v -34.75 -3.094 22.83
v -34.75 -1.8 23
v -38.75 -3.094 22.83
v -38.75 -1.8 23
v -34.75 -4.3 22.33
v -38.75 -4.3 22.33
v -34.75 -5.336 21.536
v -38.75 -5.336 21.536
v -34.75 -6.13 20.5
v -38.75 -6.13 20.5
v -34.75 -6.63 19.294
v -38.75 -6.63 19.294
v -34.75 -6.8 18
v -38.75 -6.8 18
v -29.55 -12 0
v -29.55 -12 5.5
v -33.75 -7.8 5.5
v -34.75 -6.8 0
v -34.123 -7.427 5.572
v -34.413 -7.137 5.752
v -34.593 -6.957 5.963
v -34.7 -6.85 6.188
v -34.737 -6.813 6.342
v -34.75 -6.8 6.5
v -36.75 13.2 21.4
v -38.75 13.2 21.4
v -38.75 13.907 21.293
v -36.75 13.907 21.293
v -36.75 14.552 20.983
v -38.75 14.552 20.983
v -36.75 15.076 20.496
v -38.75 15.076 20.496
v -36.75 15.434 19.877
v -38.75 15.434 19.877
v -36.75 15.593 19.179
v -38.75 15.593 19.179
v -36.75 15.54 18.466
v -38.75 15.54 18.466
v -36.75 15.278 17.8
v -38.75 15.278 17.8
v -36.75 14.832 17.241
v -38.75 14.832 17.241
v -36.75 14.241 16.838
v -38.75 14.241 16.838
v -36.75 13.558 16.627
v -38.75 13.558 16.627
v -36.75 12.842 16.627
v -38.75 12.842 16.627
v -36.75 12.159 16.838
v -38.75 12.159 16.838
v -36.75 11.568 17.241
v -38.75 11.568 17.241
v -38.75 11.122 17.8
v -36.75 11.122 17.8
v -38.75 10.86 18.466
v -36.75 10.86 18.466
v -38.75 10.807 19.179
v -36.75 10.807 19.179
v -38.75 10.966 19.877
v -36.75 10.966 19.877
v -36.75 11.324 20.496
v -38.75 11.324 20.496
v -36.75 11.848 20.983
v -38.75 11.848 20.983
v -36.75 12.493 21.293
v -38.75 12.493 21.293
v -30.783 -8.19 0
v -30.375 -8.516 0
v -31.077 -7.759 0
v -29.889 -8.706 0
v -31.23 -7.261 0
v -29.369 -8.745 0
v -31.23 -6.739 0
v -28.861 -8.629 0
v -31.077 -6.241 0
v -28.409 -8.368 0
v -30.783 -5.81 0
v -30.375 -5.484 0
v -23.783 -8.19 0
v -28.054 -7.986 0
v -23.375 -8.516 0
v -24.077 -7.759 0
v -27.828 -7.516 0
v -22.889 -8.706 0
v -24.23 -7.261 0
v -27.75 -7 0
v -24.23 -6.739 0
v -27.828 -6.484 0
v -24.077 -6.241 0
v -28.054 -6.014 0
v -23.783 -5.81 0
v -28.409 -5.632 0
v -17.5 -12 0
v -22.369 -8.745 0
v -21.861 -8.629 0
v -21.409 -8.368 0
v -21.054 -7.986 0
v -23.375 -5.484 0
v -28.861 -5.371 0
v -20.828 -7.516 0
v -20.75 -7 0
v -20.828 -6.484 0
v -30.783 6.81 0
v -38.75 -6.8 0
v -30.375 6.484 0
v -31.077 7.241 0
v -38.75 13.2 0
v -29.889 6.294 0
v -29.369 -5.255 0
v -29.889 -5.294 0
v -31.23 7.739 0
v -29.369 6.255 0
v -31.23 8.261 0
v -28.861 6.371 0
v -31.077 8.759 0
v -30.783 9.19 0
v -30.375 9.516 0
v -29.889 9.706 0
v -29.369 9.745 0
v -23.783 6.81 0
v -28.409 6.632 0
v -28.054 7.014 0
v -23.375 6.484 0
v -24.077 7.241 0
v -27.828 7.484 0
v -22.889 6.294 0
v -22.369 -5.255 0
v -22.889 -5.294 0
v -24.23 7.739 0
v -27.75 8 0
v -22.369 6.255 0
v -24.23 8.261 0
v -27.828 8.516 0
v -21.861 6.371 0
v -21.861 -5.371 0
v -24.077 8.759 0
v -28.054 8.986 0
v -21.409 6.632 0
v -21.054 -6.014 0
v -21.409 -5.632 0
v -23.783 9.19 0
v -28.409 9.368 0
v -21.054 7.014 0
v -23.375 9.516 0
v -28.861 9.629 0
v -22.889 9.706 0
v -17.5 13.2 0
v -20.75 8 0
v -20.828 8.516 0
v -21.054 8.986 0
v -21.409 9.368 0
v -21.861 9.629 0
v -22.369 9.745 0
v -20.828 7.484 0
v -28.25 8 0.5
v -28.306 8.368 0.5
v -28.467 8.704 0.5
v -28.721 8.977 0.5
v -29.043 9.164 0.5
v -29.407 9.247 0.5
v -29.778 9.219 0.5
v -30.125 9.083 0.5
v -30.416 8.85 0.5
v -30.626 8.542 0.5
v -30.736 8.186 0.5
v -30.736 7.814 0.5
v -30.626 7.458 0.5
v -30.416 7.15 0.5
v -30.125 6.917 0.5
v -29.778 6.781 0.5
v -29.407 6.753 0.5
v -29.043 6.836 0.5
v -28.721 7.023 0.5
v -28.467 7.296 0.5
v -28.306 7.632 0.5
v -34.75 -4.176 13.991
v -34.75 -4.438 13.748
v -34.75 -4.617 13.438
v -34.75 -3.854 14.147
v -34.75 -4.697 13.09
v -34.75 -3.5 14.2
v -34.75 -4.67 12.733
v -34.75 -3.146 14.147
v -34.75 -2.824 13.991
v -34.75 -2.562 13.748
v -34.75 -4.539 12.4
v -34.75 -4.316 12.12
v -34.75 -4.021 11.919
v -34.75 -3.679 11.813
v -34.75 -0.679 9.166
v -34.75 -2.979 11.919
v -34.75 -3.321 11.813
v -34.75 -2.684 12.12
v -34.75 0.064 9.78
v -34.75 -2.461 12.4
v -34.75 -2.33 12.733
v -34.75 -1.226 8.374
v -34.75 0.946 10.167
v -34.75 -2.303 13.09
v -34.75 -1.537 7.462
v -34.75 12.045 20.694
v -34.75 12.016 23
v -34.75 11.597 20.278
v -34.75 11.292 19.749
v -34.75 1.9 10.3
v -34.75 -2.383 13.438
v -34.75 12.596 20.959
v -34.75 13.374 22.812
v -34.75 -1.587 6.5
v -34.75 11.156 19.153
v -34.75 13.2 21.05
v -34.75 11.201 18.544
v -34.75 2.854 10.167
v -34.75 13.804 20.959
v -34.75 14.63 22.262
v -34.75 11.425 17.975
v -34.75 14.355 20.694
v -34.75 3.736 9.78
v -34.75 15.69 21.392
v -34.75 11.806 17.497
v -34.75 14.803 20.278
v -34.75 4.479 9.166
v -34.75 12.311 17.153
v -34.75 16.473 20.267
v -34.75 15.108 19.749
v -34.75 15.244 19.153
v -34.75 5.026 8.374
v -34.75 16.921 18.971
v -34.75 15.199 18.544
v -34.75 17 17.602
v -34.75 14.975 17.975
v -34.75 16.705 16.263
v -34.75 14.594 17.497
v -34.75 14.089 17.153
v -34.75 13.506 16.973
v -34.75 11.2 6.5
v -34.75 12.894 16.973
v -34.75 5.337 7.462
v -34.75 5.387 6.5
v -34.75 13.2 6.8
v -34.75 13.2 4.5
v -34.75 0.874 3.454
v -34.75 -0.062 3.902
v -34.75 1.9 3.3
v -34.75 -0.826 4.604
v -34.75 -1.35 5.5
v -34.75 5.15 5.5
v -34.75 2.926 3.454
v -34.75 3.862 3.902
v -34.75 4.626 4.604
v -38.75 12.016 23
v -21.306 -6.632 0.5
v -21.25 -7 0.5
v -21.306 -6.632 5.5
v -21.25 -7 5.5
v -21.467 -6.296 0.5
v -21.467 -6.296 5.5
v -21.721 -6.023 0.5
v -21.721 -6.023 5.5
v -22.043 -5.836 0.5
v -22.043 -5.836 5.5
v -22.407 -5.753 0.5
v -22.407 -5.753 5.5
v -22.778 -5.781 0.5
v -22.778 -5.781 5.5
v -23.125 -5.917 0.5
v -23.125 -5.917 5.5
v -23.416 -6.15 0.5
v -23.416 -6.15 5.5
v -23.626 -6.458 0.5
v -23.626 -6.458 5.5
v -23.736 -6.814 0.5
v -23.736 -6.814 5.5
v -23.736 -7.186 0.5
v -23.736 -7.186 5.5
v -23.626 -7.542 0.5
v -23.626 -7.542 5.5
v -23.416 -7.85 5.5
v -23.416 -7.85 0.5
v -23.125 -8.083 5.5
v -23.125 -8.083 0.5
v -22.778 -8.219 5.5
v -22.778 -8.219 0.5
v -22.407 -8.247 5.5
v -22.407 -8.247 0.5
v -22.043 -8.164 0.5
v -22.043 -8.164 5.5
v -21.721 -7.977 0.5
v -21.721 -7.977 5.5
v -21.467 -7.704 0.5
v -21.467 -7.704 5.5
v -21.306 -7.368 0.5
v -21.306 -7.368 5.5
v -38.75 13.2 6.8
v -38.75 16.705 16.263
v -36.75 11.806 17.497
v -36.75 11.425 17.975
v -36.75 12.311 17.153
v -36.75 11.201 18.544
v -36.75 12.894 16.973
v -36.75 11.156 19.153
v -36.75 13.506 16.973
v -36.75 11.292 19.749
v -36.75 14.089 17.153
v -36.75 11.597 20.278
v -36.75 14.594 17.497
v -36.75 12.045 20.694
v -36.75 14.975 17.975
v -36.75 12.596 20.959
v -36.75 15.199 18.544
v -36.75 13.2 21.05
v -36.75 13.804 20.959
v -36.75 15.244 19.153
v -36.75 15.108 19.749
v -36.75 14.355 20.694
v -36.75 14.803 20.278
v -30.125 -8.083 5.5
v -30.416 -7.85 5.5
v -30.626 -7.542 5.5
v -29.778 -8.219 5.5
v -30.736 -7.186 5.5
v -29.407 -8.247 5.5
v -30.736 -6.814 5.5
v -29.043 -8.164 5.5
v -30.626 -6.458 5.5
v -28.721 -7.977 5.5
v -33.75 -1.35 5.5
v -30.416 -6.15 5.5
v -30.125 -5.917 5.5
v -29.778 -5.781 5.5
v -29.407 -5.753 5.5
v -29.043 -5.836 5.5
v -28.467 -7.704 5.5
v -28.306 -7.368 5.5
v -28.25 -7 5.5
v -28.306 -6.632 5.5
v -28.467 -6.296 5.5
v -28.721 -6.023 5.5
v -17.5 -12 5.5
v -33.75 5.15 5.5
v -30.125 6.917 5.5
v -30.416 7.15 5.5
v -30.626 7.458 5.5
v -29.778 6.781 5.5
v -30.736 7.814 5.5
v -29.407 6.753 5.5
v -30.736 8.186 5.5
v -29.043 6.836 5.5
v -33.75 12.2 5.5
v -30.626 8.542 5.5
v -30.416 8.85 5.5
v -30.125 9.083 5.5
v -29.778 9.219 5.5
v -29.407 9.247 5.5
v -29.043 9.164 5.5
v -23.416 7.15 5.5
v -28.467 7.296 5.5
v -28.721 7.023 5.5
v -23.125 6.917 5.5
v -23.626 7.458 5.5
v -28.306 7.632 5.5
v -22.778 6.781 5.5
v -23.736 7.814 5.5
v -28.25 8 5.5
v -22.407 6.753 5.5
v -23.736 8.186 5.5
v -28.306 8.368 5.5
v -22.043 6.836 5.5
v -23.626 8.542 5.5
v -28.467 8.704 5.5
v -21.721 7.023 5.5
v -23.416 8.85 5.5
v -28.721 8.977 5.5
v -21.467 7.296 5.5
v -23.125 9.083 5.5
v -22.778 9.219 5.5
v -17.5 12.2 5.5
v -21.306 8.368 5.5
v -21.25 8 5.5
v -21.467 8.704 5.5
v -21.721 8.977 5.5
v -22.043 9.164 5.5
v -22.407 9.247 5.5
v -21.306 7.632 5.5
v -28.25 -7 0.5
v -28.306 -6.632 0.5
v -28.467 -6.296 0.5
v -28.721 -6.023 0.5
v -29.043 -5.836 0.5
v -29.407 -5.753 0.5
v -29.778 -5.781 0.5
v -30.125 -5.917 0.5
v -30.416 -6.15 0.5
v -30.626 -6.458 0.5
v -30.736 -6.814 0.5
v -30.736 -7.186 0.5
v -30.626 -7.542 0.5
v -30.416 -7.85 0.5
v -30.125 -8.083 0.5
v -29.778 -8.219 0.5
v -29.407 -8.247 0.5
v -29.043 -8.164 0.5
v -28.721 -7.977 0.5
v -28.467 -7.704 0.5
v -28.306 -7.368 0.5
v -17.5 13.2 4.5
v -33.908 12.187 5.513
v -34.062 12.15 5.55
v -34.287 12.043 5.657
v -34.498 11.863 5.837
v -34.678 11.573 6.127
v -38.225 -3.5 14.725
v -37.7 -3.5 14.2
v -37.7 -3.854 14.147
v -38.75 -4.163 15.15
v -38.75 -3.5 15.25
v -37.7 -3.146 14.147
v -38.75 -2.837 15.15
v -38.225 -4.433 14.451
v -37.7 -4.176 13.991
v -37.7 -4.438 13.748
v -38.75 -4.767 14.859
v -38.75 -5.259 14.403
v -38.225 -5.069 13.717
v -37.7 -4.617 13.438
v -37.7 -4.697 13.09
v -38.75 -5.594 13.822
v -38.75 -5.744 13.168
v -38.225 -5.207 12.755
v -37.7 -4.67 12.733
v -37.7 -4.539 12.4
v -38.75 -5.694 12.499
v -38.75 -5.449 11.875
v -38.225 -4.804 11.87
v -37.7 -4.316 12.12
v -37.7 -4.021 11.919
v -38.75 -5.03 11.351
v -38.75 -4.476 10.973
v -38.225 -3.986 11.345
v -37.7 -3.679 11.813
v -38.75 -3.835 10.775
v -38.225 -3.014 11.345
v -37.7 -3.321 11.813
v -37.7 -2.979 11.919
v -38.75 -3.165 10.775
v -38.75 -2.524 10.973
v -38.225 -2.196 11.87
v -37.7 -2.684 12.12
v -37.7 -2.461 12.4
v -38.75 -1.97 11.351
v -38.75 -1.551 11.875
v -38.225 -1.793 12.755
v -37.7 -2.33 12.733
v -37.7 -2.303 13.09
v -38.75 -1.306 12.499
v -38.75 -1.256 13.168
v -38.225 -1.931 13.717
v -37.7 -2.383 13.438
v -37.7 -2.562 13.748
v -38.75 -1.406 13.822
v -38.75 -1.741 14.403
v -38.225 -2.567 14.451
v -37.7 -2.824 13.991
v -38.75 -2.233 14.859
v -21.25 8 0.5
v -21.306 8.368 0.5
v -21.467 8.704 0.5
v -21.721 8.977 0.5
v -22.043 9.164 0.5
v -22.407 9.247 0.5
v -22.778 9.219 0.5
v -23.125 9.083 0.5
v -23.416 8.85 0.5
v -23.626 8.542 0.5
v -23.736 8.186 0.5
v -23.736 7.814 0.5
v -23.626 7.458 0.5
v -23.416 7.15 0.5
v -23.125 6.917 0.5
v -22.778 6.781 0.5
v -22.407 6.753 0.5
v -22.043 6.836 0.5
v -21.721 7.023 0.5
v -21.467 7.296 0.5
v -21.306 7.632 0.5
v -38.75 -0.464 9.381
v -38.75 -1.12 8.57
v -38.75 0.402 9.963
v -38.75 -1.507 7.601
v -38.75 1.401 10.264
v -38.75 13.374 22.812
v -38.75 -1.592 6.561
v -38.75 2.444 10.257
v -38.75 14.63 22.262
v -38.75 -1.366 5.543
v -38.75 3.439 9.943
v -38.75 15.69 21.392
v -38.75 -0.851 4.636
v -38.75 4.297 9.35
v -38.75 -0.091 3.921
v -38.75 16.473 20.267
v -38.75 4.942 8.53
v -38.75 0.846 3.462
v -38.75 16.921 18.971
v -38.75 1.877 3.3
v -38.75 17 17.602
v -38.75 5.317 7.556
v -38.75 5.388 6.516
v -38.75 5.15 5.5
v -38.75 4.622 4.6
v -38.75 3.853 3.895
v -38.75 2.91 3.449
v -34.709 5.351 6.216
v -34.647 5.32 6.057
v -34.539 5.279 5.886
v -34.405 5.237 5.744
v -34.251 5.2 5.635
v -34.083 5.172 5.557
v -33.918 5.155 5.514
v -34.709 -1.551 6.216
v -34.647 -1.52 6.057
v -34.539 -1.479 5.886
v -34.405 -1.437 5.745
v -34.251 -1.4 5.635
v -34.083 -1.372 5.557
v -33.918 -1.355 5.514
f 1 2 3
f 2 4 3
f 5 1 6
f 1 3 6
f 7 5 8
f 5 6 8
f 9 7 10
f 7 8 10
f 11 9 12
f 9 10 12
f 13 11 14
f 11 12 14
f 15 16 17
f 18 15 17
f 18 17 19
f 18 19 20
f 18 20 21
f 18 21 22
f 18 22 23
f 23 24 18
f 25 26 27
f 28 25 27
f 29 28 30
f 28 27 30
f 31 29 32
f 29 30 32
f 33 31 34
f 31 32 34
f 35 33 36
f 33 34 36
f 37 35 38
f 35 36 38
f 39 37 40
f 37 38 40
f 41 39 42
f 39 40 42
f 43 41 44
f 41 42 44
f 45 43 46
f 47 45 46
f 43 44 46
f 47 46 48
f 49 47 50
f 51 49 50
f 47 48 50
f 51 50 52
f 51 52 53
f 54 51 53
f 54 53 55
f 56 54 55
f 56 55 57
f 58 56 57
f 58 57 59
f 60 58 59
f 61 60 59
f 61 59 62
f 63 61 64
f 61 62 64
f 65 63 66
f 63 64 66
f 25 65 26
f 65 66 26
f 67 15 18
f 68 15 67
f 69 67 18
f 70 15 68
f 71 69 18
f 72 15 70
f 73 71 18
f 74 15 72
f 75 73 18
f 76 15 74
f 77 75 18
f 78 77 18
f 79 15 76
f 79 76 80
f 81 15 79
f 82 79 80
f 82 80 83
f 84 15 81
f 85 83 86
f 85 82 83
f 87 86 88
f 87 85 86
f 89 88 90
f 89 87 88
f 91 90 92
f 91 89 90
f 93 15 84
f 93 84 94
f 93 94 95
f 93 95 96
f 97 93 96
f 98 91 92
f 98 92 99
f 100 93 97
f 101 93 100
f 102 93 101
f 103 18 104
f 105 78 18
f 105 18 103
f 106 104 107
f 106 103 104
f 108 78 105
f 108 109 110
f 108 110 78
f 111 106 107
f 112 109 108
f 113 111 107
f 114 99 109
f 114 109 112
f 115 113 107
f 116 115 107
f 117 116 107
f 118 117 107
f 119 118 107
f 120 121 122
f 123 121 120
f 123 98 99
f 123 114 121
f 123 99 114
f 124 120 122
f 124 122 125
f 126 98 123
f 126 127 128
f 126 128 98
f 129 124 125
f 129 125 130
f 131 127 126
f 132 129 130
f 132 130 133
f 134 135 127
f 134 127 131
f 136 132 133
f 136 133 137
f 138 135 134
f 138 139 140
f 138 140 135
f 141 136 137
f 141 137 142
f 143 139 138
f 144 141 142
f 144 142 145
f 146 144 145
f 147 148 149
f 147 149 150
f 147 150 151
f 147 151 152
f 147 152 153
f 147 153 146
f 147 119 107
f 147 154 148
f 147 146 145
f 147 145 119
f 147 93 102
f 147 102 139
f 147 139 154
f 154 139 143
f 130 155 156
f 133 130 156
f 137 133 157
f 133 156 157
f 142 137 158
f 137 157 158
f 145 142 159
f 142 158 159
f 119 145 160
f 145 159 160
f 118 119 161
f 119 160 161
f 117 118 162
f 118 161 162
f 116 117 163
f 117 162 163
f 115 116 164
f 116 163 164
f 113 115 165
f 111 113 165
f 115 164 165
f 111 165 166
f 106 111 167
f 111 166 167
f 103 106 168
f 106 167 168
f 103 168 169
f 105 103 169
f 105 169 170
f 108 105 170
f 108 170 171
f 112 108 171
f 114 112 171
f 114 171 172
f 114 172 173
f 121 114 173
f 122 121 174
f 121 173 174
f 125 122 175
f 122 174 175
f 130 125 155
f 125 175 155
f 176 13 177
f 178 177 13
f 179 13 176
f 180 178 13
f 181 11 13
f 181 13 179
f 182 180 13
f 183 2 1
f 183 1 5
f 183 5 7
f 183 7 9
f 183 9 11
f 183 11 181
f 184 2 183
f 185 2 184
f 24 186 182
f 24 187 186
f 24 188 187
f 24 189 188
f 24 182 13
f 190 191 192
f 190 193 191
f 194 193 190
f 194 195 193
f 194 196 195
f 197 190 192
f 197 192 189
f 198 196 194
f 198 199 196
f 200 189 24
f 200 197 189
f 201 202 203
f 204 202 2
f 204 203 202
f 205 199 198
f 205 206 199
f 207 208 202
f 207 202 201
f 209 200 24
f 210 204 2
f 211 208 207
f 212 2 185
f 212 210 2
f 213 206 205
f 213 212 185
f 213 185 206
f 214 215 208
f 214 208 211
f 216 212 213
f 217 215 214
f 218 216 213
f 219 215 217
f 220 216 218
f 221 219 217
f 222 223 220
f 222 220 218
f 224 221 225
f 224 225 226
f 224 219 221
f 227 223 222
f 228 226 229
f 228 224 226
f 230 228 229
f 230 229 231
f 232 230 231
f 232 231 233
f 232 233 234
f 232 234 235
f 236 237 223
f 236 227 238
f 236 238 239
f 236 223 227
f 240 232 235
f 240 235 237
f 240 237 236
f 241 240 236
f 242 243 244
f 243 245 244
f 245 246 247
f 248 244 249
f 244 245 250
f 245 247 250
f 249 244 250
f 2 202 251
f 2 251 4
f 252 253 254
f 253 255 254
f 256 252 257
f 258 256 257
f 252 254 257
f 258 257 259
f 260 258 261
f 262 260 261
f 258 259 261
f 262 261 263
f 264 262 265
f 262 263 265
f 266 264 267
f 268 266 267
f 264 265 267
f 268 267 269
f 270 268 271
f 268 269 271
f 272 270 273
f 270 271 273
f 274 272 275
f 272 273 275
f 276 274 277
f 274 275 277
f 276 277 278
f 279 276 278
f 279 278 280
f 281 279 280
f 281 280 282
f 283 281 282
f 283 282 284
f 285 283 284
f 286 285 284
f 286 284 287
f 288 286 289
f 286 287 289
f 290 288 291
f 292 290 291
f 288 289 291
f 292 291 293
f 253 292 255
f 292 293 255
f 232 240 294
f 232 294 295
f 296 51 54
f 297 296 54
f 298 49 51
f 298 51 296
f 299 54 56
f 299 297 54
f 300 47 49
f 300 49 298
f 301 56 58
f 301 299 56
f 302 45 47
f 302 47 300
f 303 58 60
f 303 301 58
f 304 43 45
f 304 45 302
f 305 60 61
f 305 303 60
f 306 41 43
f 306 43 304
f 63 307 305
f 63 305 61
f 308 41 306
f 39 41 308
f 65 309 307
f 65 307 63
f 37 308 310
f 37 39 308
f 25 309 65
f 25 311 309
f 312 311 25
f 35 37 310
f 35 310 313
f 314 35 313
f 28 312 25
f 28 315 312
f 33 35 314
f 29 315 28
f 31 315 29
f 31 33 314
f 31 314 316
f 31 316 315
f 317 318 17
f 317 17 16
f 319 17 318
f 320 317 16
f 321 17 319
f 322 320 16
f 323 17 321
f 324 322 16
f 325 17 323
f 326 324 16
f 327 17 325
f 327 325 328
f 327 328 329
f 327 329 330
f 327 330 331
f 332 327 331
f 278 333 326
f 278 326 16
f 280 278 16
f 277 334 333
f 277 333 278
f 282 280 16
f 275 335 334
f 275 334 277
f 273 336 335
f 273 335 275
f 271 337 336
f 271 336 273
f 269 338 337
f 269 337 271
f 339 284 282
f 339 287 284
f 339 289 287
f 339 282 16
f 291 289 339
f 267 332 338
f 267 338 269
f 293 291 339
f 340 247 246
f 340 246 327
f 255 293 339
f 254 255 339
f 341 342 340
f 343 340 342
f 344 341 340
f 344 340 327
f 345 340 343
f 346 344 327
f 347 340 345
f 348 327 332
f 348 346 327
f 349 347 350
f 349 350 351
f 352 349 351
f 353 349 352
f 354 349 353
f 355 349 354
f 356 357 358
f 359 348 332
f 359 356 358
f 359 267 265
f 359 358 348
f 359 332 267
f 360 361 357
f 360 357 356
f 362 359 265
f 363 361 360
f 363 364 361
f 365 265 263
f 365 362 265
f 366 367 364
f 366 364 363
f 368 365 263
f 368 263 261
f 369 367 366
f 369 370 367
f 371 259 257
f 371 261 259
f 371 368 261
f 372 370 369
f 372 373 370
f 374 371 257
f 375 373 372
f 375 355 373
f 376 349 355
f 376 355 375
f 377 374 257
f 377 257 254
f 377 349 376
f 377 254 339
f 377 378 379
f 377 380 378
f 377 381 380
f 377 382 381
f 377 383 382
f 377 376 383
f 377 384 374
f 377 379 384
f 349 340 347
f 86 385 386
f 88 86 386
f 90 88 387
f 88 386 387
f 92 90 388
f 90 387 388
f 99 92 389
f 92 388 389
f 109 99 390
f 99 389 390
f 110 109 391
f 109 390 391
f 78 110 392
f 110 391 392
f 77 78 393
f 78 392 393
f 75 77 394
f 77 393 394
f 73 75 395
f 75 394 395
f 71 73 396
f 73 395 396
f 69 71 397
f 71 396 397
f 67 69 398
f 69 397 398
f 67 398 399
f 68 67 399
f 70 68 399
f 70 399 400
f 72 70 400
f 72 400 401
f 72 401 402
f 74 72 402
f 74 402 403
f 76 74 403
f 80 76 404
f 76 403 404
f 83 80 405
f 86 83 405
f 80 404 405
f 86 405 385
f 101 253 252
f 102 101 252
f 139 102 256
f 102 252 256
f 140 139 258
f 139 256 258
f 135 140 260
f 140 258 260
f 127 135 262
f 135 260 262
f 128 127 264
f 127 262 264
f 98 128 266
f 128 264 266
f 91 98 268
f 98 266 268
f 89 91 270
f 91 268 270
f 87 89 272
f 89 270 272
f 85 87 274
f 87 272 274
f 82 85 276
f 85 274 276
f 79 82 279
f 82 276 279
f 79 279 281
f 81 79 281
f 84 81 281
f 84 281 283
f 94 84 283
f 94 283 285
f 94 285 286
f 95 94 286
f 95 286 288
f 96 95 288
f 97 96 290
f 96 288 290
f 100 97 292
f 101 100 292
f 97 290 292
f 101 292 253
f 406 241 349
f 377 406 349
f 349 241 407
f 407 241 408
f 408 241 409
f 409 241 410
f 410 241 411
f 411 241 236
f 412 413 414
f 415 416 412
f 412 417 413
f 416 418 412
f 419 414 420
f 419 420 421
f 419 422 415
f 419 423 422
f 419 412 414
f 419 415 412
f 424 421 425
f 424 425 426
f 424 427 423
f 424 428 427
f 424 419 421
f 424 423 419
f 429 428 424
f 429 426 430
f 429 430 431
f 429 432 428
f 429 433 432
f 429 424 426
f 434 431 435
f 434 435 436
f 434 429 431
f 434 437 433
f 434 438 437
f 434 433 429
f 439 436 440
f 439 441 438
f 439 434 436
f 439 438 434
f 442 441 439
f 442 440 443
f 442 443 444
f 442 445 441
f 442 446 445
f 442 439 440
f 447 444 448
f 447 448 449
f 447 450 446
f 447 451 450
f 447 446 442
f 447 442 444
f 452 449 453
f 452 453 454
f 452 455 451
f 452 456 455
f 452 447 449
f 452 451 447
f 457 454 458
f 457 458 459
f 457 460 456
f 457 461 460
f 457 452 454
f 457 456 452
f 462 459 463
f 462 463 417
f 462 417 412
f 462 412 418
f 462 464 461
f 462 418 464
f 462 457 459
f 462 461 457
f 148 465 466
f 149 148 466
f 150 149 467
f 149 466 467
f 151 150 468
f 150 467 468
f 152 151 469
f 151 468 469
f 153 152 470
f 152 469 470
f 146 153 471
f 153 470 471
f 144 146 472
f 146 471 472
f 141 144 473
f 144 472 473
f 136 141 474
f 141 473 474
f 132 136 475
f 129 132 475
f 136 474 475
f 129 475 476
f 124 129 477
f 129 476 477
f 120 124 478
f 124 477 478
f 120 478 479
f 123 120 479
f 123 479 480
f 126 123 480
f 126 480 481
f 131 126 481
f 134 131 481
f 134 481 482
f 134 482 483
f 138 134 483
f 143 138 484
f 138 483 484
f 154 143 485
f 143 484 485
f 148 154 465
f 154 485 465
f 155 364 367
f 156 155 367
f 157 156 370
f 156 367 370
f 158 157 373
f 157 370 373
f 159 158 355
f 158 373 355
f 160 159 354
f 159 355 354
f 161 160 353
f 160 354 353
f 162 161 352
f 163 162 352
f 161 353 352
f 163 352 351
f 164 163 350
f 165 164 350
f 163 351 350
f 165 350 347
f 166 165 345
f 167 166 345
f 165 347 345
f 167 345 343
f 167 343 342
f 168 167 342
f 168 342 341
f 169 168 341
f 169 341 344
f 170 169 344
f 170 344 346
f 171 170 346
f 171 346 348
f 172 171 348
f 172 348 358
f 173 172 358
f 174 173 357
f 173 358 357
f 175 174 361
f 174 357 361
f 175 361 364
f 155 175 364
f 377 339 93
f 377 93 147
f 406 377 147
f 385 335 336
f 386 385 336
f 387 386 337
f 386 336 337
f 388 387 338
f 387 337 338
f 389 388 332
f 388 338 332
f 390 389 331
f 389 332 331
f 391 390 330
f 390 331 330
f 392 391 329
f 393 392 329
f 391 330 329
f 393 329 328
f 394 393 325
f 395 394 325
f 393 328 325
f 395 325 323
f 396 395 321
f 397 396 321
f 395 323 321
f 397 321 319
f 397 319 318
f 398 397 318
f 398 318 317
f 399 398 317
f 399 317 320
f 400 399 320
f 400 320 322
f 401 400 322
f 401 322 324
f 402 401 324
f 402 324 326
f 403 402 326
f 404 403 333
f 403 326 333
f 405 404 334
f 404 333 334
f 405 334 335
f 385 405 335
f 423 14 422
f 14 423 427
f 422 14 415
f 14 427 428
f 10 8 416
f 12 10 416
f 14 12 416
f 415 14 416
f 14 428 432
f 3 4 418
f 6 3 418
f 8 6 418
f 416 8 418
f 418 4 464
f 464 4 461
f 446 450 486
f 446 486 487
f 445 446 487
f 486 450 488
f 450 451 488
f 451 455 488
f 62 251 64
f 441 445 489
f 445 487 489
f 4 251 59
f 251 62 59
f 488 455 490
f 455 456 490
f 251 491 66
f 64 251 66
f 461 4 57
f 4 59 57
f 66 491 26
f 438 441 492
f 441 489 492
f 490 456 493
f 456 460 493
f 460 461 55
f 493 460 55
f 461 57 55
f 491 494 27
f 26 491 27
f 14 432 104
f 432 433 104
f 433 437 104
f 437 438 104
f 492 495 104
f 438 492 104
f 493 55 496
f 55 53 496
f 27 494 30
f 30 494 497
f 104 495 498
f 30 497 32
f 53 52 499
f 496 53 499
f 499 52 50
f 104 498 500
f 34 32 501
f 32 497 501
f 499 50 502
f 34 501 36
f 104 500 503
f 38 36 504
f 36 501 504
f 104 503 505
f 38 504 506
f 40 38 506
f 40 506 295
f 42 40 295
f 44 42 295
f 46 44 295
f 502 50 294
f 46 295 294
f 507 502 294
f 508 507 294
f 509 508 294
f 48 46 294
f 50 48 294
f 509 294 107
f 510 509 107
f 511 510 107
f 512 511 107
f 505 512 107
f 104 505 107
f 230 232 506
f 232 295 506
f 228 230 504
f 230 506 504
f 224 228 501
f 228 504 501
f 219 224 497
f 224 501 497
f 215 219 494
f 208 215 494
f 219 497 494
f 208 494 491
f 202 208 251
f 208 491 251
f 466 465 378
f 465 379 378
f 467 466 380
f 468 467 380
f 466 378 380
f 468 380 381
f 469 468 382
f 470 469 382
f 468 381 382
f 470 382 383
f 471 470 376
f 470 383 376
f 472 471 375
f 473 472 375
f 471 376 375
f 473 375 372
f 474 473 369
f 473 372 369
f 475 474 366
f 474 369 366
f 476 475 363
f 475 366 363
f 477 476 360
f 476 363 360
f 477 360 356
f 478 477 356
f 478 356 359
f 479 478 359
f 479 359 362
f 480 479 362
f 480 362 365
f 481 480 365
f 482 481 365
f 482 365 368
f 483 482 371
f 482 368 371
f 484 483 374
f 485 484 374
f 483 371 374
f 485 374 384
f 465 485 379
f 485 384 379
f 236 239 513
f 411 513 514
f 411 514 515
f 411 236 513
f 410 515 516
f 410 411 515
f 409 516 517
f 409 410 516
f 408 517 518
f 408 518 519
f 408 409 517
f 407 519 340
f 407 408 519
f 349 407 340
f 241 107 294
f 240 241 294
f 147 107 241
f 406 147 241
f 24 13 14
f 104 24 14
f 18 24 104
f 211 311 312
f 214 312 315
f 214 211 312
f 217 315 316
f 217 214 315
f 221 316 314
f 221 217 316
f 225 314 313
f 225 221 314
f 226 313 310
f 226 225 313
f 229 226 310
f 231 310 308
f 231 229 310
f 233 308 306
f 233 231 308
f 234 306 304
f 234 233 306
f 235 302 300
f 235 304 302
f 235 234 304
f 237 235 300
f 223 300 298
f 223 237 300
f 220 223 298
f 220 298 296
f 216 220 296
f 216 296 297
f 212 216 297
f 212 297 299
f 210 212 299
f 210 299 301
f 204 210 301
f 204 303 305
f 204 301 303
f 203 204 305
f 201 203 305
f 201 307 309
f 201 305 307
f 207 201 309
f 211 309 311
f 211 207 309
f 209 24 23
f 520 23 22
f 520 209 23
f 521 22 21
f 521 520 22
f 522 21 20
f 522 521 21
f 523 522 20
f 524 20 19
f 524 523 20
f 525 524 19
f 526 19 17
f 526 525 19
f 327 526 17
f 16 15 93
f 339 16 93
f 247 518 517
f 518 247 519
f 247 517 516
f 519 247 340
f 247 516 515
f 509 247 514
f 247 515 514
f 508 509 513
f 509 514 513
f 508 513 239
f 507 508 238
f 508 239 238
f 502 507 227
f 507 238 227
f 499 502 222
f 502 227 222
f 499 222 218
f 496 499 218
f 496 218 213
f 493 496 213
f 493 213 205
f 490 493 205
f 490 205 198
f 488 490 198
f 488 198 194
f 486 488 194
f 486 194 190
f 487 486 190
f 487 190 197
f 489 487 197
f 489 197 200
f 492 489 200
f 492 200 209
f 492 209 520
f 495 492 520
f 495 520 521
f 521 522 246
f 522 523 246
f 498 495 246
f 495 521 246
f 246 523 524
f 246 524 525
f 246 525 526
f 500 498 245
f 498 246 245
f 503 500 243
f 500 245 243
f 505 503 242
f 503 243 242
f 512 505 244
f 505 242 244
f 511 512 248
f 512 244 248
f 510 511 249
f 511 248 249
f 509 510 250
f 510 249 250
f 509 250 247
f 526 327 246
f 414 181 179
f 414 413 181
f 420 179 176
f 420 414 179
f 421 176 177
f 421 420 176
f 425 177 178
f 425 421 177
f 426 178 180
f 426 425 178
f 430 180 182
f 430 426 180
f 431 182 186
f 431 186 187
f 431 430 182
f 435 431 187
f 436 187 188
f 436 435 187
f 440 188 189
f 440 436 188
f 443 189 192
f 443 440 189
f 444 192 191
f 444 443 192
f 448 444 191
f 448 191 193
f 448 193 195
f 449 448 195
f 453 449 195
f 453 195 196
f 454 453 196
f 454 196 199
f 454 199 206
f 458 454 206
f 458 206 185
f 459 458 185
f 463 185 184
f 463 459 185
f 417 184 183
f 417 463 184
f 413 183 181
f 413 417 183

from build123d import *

# Parameters (mm, degrees)
SKETCH_1_W             = 69.5
SKETCH_1_H             = 24
EXTRUDE_1_DEPTH        = 10.5
SKETCH_2_W             = 35
SKETCH_2_H             = 3
CUT_EXTRUDE_2_DEPTH    = 24
HOLE_WIZARD_M3_1_D     = 2.5
HOLE_WIZARD_M3_1_DEPTH = 7.5
HOLE_WIZARD_M3_1_TIP   = 0.751075774
CHAMFER_1_SIZE         = 0.5
CHAMFER_2_SIZE         = 0.5
CHAMFER_3_SIZE         = 5.2
FILLET1_R              = 2
SKETCH_8_W             = 10.5
SKETCH_8_H             = 1.2
EXTRUDE_1_2_DEPTH      = 69.5
SKETCH_7_W             = 35
SKETCH_7_H             = 30
CUT_EXTRUDE_1_DEPTH    = 71.5
FILLET_1_R             = 2
FILLET_2_R             = 2
SKETCH2_W              = 16.266114445
SKETCH2_H              = 35.800653755
SKETCH2_W_2            = 16.722173729
SKETCH2_H_2            = 38.308979815
EXTRUDE1_DEPTH         = 5
SKETCH4_R              = 2.05
SKETCH4_R_2            = 3.5
EXTRUDE2_DEPTH         = 4
FILLET2_R              = 5
SKETCH7_R              = 3.5
SKETCH7_R_2            = 2.05
EXTRUDE3_DEPTH         = 4
FILLET3_R              = 5
FILLET5_R              = 1
SKETCH14_R             = 2.4
EXTRUDE4_DEPTH         = 2
SKETCH15_R             = 2.4
EXTRUDE5_DEPTH         = 2
SKETCH_9_W             = 36.650882696
SKETCH_9_H             = 47.613245362
CUT_EXTRUDE_2_2_DEPTH  = 49.168282868
SKETCH_10_W            = 16.727542875
SKETCH_10_H            = 39.365484233
CUT_EXTRUDE_3_DEPTH    = 5
CHAMFER_8_SIZE         = 1
FILLET_4_R             = 1


with BuildPart() as part:
    # 草图1 → Extrude 1 (new body)
    with BuildSketch(Plane.XY):
        Rectangle(SKETCH_1_W, SKETCH_1_H)
    extrude(amount=EXTRUDE_1_DEPTH)

    # 草图2 → Cut-Extrude 2 (cut)
    with BuildSketch(Plane.XZ.offset(12)):
        with Locations((0, 1.5)):
            Rectangle(SKETCH_2_W, SKETCH_2_H)
    extrude(amount=-CUT_EXTRUDE_2_DEPTH, mode=Mode.SUBTRACT)

    # M3 螺纹孔1
    with Locations(Plane(origin=(22.5, 8, 0), x_dir=(-1, 0, 0), z_dir=(0, 0, -1))):
        with Locations((0, 0), (0, -15), (45, -15), (45, 0), (-7, 0), (-7, -15), (52, -15), (52, 0)):
            Hole(HOLE_WIZARD_M3_1_D / 2, depth=HOLE_WIZARD_M3_1_DEPTH)
            with Locations((0, 0, -(HOLE_WIZARD_M3_1_DEPTH + HOLE_WIZARD_M3_1_TIP / 2))):  # 118° drill point
                Cone(0, HOLE_WIZARD_M3_1_D / 2, HOLE_WIZARD_M3_1_TIP, mode=Mode.SUBTRACT)

    # 倒角1
    chamfer_1_edges = [part.edges().sort_by_distance(p)[0] for p in [
        (-23.75, 8, 0),
        (-23.75, -7, 0),
        (21.25, -7, 0),
        (21.25, 8, 0),
    ]]
    chamfer(chamfer_1_edges, length=CHAMFER_1_SIZE)

    # 倒角2
    chamfer_2_edges = [part.edges().sort_by_distance(p)[0] for p in [
        (-30.75, 8, 0),
        (-30.75, -7, 0),
        (28.25, -7, 0),
        (28.25, 8, 0),
    ]]
    chamfer(chamfer_2_edges, length=CHAMFER_2_SIZE)

    # 倒角3
    chamfer_3_edges = [part.edges().sort_by_distance(p)[0] for p in [
        (34.75, -12, 5.25),
        (-34.75, -12, 5.25),
    ]]
    chamfer(chamfer_3_edges, length=CHAMFER_3_SIZE)

    # Fillet1
    fillet1_edges = [part.edges().sort_by_distance(p)[0] for p in [
        (0, -12, 10.5),
    ]]
    fillet(fillet1_edges, radius=FILLET1_R)

    # 草图8 → Extrude 1 2 (add)
    with BuildSketch(Plane(origin=(34.75, 0, 0), x_dir=(0, 0, -1), z_dir=(1, 0, 0))):
        with Locations((-5.25, 12.6)):
            Rectangle(SKETCH_8_W, SKETCH_8_H)
    extrude(amount=-EXTRUDE_1_2_DEPTH)

    # 草图7 → 切除-拉伸1 (cut)
    with BuildSketch(Plane.XY.offset(10.5)):
        with Locations((0, 3)):
            Rectangle(SKETCH_7_W, SKETCH_7_H)
    extrude(amount=-CUT_EXTRUDE_1_DEPTH, mode=Mode.SUBTRACT)


with BuildPart() as cut_extrude_1_piece_1:
    # of the separate pieces the step leaves, piece 1, a body of its own (cut_extrude_1_pieces)
    add(part.part.solids().sort_by_distance((29.55, -12, 8.5))[0])

    # 圆角1
    fillet_1_edges = [cut_extrude_1_piece_1.edges().sort_by_distance(p)[0] for p in [
        (26.125, 13.2, 10.5),
    ]]
    fillet(fillet_1_edges, radius=FILLET_1_R)


with BuildPart() as cut_extrude_1_piece_2:
    # of the separate pieces the step leaves, piece 2, a body of its own (cut_extrude_1_pieces)
    add(part.part.solids().sort_by_distance((-29.55, -12, 8.5))[0])

    # 圆角2
    fillet_2_edges = [cut_extrude_1_piece_2.edges().sort_by_distance(p)[0] for p in [
        (-26.125, 13.2, 10.5),
    ]]
    fillet(fillet_2_edges, radius=FILLET_2_R)


with BuildPart() as extrude1_tool:
    # Sketch2 → Extrude1 (new body)
    with BuildSketch(Plane.XY.offset(10.5)):
        with Locations((34.133057222, -0.236108687)):
            Rectangle(SKETCH2_W, SKETCH2_H)
        with Locations((-34.361086865, 1.85416303)):
            Rectangle(SKETCH2_W_2, SKETCH2_H_2)
    extrude(amount=-EXTRUDE1_DEPTH)


with BuildPart() as cut_extrude_1_piece_1_1:
    add(cut_extrude_1_piece_1.part)

    # Extrude1: cut by extrude1_tool
    add(extrude1_tool.part, mode=Mode.SUBTRACT)

    # Sketch7 → Extrude3 (add)
    with BuildSketch(Plane(origin=(34.75, 0, 0), x_dir=(0, 0, -1), z_dir=(1, 0, 0))):
        Polygon((0, -6.797975685), (0, 13.202024315), (-6.8, 13.202024315), (-23, 19.202024315), (-23, -6.797975685), align=None)
        with Locations(Location((-6.8, 1.9, 0), (0, 0, 68.196252011))):
            Circle(SKETCH7_R, mode=Mode.SUBTRACT)
        with Locations(Location((-19, 13.2, 0), (0, 0, 180))):
            Circle(SKETCH7_R_2, mode=Mode.SUBTRACT)
    extrude(amount=EXTRUDE3_DEPTH)

    # Fillet3
    fillet3_edges = [cut_extrude_1_piece_1_1.edges().sort_by_distance(p)[0] for p in [
        (36.75, -6.797975685, 23),
        (36.75, 19.202024315, 23),
    ]]
    fillet(fillet3_edges, radius=FILLET3_R)

    # Sketch12 → CSK for M2 Slotted raised CTSK head wood (revolve, cut)
    with BuildSketch(Plane(origin=(38.75, -3.5, 13), x_dir=(0, 0, -1), z_dir=(0, 1, 0))):
        Polygon((0, 0), (0, 77.5), (1.2, 77.5), (1.2, 1.05), (2.25, 0), align=None)
    revolve(axis=Axis((45.1, -3.5, 13), (-1, 0, 0)), mode=Mode.SUBTRACT)

    # Fillet5
    # the kernel refuses this fillet: 1 mm, written as the material it adds along each edge
    with BuildSketch(Plane(origin=(26, -12, 5.5), x_dir=(1, 0, 0), z_dir=(0, 1, 0))) as fillet5_piece_1:
        with BuildLine():
            CenterArc((FILLET5_R, -FILLET5_R), FILLET5_R, 90, 90)
            Line((0, -FILLET5_R), (0, 0))
            Line((0, 0), (FILLET5_R, 0))
        make_face()
    extrude(amount=25.2)
    with BuildSketch(Plane(origin=(34.75, -6.797975685, 5.5), x_dir=(0, 0, 1), z_dir=(0, 1, 0))) as fillet5_piece_2_section:
        with BuildLine():
            CenterArc((FILLET5_R, -FILLET5_R), FILLET5_R, 90, 90)
            Line((0, -FILLET5_R), (0, 0))
            Line((0, 0), (FILLET5_R, 0))
        make_face()
    fillet5_piece_2 = extrude(amount=7.948360323, mode=Mode.PRIVATE)
    fillet5_piece_2 = fillet5_piece_2 - Plane(origin=(34.525455487, 1.9, 6.8), x_dir=(0, 0.9284615319608756, -0.371428571422372), z_dir=(-1, 0, 0)) * Cylinder(3.5, 20, mode=Mode.PRIVATE)
    add(fillet5_piece_2)
    with BuildSketch(Plane(origin=(34.75, 2.649615362, 5.5), x_dir=(0, 0, 1), z_dir=(0, 1, 0))) as fillet5_piece_3_section:
        with BuildLine():
            CenterArc((FILLET5_R, -FILLET5_R), FILLET5_R, 90, 90)
            Line((0, -FILLET5_R), (0, 0))
            Line((0, 0), (FILLET5_R, 0))
        make_face()
    fillet5_piece_3 = extrude(amount=10.550384638, mode=Mode.PRIVATE)
    fillet5_piece_3 = fillet5_piece_3 - Plane(origin=(34.525839379, 1.9, 6.8), x_dir=(0, 0.9284615319608756, -0.371428571422372), z_dir=(-1, 0, 0)) * Cylinder(3.5, 26, mode=Mode.PRIVATE)
    add(fillet5_piece_3)

    # Sketch15 → Extrude5 (cut)
    with BuildSketch(Plane(origin=(38.75, 0, 0), x_dir=(0, 0, -1), z_dir=(1, 0, 0))):
        with Locations(Location((-19, 13.2, 0), (0, 0, 180))):
            Circle(SKETCH15_R)
    extrude(amount=-EXTRUDE5_DEPTH, mode=Mode.SUBTRACT)

    # 草图9 → Cut-Extrude 2 2 (cut, through all)
    with BuildSketch(Plane.XY.offset(23)):
        with Locations((21.816576683, -0.846593787)):
            Rectangle(SKETCH_9_W, SKETCH_9_H)
    extrude(amount=-CUT_EXTRUDE_2_2_DEPTH, mode=Mode.SUBTRACT)


with BuildPart() as cut_extrude_1_piece_2_1:
    add(cut_extrude_1_piece_2.part)

    # Extrude1: cut by extrude1_tool
    add(extrude1_tool.part, mode=Mode.SUBTRACT)

    # Sketch4 → Extrude2 (add)
    with BuildSketch(Plane.ZY.offset(34.75)):
        Polygon((0, -6.8), (0, 13.2), (6.8, 13.2), (23, 19.2), (23, -6.8), align=None)
        with Locations((19, 13.2)):
            Circle(SKETCH4_R, mode=Mode.SUBTRACT)
        with Locations(Location((6.8, 1.9, 0), (0, 0, 111.803747989))):
            Circle(SKETCH4_R_2, mode=Mode.SUBTRACT)
    extrude(amount=EXTRUDE2_DEPTH)

    # Fillet2
    fillet2_edges = [cut_extrude_1_piece_2_1.edges().sort_by_distance(p)[0] for p in [
        (-36.75, -6.8, 23),
        (-36.75, 19.2, 23),
    ]]
    fillet(fillet2_edges, radius=FILLET2_R)

    # Sketch13 → CSK for M2 Slotted raised CTSK head  2 (revolve, cut)
    with BuildSketch(Plane(origin=(-38.75, -3.5, 13), x_dir=(0, 0, 1), z_dir=(0, 1, 0))):
        Polygon((0, 0), (0, 4), (1.2, 4), (1.2, 1.05), (2.25, 0), align=None)
    revolve(axis=Axis((-45.1, -3.5, 13), (1, 0, 0)), mode=Mode.SUBTRACT)

    # Sketch14 → Extrude4 (cut)
    with BuildSketch(Plane.ZY.offset(38.75)):
        with Locations((19, 13.2)):
            Circle(SKETCH14_R)
    extrude(amount=-EXTRUDE4_DEPTH, mode=Mode.SUBTRACT)

    # 草图10 → 切除-拉伸3 (cut)
    with BuildSketch(Plane.XY.offset(10.5)):
        with Locations((-20.237373351, 1.950530044)):
            Rectangle(SKETCH_10_W, SKETCH_10_H)
    extrude(amount=-CUT_EXTRUDE_3_DEPTH, mode=Mode.SUBTRACT)

    # 倒角8
    chamfer_8_edges = [cut_extrude_1_piece_2_1.edges().sort_by_distance(p)[0] for p in [
        (-26.125, 13.2, 5.5),
    ]]
    chamfer(chamfer_8_edges, length=CHAMFER_8_SIZE)

    # 圆角4
    # the kernel refuses this fillet: 1 mm, written as the material it adds along each edge
    with BuildSketch(Plane(origin=(-34.75, 14.7, 5.5), x_dir=(0, 0, 1), z_dir=(0, -1, 0))) as fillet_4_piece_1_section:
        with BuildLine():
            CenterArc((FILLET_4_R, -FILLET_4_R), FILLET_4_R, 90, 90)
            Line((0, -FILLET_4_R), (0, 0))
            Line((0, 0), (FILLET_4_R, 0))
        make_face()
    fillet_4_piece_1 = extrude(amount=12.050384638, mode=Mode.PRIVATE)
    fillet_4_piece_1 = fillet_4_piece_1 - Plane(origin=(-34.522632455, 1.9, 6.8), x_dir=(0, 0.9284615319608756, -0.3714285714223719), z_dir=(1, 0, 0)) * Cylinder(3.5, 29, mode=Mode.PRIVATE)
    fillet_4_piece_1 = split(fillet_4_piece_1, bisect_by=Plane(origin=(-34.522632455, 10.293168588, 7.406831412), z_dir=(0, -0.7071067811865476, -0.7071067811865476)), keep=Keep.TOP, mode=Mode.PRIVATE)
    add(fillet_4_piece_1)
    with BuildSketch(Plane(origin=(-34.75, 1.150384638, 5.5), x_dir=(0, 0, 1), z_dir=(0, -1, 0))) as fillet_4_piece_2_section:
        with BuildLine():
            CenterArc((FILLET_4_R, -FILLET_4_R), FILLET_4_R, 90, 90)
            Line((0, -FILLET_4_R), (0, 0))
            Line((0, 0), (FILLET_4_R, 0))
        make_face()
    fillet_4_piece_2 = extrude(amount=10.450384638, mode=Mode.PRIVATE)
    fillet_4_piece_2 = split(fillet_4_piece_2, bisect_by=Plane(origin=(-35.981733075, -5.568266925, 5.72144918), z_dir=(0.7071067811865476, 0.7071067811865475, 0)), keep=Keep.TOP, mode=Mode.PRIVATE)
    fillet_4_piece_2 = fillet_4_piece_2 - Plane(origin=(-34.525455927, 1.9, 6.8), x_dir=(0, 0.9284615319608756, -0.3714285714223719), z_dir=(1, 0, 0)) * Cylinder(3.5, 25, mode=Mode.PRIVATE)
    add(fillet_4_piece_2)


solid = cut_extrude_1_piece_2_1.part
